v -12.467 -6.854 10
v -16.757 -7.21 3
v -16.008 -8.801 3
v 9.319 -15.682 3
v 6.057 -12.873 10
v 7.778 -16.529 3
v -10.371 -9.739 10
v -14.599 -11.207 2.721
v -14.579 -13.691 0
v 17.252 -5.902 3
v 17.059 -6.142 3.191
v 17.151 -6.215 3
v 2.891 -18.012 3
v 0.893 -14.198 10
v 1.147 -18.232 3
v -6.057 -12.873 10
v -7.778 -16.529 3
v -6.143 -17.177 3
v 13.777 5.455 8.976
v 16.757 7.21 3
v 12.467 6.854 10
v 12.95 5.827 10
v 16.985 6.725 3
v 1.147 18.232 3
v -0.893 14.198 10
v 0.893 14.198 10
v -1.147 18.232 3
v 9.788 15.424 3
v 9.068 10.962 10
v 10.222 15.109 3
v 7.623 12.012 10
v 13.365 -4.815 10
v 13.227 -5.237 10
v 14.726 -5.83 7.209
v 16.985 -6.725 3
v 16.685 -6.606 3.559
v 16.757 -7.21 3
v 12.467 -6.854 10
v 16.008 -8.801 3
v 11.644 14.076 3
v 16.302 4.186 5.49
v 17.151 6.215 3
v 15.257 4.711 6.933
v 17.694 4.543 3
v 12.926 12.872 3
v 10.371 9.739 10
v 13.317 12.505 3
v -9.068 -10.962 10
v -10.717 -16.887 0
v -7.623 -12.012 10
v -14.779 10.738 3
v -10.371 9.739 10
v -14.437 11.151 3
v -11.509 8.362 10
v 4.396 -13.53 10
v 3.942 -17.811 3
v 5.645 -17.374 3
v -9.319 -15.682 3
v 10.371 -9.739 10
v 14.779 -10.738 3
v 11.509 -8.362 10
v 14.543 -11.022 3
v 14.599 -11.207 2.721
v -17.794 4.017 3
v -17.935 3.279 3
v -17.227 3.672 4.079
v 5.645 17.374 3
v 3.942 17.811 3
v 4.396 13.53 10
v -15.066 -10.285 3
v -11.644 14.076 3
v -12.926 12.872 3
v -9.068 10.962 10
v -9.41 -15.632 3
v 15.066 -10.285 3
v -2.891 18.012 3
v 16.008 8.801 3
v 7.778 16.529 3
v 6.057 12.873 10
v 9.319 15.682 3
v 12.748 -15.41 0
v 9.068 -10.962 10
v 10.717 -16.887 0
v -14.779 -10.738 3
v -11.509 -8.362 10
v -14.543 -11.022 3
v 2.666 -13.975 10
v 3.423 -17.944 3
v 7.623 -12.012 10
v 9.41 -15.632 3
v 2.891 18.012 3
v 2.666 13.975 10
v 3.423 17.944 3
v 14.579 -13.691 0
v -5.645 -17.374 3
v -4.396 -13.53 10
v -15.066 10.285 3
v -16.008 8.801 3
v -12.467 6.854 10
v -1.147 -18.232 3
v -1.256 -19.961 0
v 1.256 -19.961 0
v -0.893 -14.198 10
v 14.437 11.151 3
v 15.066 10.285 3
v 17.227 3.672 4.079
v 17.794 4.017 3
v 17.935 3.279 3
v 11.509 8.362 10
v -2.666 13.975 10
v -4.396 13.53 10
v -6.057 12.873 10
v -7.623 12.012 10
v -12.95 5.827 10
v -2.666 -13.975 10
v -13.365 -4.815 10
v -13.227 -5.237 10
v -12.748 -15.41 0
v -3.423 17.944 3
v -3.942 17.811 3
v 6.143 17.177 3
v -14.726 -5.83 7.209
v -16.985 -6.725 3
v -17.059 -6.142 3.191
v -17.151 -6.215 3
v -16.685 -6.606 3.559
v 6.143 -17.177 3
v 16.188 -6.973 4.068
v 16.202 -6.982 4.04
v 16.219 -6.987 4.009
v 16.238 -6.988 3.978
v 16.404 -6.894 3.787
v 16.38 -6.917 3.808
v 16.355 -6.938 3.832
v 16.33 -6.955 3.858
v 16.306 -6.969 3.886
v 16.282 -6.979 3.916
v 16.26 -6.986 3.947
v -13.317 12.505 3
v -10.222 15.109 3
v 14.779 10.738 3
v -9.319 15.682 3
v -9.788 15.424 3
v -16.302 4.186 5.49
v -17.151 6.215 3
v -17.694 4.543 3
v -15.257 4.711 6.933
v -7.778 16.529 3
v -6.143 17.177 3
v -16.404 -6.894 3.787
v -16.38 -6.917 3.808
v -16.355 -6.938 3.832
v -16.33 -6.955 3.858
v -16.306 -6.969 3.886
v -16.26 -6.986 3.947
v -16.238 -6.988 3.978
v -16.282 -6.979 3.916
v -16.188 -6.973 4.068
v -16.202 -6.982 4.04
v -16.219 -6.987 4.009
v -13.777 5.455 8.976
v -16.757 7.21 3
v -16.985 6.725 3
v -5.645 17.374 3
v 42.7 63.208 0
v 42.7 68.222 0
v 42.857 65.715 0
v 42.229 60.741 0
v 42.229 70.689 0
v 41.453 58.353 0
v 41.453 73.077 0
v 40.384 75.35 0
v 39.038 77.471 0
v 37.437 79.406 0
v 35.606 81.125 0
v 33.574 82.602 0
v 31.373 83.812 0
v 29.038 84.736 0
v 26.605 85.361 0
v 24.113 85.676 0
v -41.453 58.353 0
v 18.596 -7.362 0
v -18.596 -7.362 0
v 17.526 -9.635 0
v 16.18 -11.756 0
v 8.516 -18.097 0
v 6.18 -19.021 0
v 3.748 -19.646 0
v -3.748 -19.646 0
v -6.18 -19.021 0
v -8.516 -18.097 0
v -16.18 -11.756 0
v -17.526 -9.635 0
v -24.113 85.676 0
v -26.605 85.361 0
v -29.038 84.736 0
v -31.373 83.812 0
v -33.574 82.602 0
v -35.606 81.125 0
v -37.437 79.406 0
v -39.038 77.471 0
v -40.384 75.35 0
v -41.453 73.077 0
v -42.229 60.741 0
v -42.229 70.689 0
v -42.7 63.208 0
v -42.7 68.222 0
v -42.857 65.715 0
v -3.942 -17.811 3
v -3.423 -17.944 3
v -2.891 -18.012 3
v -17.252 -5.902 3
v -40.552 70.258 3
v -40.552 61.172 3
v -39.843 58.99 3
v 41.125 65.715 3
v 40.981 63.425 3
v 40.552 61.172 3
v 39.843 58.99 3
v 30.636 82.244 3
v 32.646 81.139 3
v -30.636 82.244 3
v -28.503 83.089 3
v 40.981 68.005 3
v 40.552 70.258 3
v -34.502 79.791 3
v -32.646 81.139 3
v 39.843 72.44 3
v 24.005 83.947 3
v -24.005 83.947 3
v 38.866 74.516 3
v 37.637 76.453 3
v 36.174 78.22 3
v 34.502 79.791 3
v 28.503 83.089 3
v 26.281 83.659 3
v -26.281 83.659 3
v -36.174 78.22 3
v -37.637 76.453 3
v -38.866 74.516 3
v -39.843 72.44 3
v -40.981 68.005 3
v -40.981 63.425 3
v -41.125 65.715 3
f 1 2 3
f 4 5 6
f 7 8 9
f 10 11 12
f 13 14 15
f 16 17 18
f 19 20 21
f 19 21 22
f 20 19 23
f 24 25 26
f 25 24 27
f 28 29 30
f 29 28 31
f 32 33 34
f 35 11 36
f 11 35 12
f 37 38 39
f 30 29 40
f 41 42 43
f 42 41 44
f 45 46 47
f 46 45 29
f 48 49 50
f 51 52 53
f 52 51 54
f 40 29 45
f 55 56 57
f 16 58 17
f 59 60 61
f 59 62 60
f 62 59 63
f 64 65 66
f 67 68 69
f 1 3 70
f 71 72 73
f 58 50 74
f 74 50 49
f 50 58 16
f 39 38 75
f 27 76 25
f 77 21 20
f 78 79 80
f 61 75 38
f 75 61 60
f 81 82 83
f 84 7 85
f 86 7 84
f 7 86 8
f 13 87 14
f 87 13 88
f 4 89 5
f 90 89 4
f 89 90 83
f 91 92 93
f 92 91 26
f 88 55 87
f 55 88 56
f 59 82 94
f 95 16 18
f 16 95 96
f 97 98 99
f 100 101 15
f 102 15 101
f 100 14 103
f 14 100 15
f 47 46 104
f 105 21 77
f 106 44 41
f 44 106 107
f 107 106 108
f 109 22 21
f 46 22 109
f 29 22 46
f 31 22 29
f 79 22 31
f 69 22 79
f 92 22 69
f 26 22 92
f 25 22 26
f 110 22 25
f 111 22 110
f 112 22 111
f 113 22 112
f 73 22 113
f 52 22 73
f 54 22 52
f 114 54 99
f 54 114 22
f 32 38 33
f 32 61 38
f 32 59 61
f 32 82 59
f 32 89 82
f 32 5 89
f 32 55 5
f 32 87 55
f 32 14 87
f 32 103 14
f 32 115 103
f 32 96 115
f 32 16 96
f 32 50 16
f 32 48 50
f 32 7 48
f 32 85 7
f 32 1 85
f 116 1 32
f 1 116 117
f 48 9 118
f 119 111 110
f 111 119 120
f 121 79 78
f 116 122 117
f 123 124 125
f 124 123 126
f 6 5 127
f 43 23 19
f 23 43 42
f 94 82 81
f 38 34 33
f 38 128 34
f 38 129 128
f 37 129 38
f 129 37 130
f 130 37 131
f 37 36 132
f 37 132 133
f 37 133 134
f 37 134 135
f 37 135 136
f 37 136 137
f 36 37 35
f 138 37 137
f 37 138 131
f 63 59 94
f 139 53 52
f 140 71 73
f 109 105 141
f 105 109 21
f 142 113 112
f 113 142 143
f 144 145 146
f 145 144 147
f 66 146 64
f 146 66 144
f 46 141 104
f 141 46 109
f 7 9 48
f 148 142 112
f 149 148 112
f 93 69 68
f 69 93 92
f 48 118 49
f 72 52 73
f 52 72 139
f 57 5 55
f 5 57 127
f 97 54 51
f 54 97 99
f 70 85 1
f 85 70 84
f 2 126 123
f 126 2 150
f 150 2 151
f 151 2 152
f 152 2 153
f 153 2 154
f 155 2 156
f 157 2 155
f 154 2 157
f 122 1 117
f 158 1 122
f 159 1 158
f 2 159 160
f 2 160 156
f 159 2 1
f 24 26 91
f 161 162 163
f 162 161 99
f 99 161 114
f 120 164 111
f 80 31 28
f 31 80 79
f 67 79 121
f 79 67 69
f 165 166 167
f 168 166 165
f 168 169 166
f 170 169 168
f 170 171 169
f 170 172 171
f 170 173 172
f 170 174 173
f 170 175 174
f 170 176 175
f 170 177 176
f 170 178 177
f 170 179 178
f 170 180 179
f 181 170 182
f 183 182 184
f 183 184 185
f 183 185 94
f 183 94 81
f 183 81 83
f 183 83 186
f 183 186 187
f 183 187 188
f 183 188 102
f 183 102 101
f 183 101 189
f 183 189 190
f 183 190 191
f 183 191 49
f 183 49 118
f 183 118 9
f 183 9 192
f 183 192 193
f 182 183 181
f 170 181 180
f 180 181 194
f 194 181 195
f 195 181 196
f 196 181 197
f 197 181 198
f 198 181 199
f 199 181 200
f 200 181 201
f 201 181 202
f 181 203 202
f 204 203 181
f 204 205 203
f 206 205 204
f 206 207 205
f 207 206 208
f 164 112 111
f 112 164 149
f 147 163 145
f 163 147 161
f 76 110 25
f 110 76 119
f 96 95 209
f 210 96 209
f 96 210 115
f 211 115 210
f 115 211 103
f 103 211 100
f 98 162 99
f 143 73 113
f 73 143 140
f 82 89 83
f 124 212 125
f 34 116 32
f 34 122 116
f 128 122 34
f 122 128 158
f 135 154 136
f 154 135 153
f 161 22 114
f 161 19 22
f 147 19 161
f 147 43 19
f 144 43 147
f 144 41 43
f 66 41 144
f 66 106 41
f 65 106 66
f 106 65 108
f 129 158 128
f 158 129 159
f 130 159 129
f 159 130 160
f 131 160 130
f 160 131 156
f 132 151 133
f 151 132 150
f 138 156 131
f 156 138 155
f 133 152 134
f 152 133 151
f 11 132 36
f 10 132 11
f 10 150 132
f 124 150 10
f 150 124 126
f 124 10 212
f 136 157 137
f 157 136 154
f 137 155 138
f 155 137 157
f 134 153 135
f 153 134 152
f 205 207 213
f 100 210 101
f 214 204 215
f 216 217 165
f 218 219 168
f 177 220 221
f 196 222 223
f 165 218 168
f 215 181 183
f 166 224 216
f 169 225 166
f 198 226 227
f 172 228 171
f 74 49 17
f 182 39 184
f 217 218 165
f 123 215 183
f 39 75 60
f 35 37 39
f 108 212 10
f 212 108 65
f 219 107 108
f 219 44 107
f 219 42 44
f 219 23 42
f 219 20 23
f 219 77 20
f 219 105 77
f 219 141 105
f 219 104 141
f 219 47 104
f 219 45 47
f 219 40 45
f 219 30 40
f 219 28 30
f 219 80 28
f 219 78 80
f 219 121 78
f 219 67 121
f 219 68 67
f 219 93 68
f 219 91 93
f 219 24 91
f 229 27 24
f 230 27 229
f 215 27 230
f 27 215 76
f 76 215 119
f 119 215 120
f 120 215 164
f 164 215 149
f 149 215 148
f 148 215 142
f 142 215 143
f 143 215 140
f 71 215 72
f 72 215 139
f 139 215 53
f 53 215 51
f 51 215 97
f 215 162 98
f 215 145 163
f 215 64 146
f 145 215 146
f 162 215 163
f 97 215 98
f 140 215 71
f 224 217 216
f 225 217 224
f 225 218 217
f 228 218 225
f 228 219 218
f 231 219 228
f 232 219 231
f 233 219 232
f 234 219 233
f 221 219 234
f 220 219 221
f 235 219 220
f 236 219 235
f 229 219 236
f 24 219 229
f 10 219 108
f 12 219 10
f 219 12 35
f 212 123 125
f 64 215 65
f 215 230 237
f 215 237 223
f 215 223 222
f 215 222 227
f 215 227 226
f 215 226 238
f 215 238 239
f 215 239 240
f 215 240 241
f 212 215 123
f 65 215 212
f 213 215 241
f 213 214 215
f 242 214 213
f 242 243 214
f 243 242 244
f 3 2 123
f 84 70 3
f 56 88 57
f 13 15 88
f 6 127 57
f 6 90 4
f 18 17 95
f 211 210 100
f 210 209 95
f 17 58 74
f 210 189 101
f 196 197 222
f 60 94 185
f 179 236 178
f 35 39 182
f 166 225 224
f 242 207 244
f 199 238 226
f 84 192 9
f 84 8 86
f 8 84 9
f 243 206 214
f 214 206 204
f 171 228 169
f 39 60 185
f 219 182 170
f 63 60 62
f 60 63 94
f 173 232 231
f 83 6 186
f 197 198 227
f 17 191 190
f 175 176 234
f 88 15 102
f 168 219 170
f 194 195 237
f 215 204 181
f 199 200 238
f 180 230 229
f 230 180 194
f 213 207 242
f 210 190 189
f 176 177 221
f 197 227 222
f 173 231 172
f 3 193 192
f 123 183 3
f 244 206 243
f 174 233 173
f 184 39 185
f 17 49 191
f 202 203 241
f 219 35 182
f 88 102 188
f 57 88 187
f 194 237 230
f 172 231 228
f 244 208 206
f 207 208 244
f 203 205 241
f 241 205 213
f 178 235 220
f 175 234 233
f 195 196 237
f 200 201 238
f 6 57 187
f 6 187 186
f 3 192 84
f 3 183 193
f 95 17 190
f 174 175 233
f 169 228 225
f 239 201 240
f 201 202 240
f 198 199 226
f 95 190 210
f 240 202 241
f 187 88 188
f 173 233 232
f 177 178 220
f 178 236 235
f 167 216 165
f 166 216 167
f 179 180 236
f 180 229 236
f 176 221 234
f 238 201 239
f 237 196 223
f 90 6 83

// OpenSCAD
$fn=50;


/* [Dimensions] */
ttDia=40;
ttHght=10;
monOffset=[0,-5.5,3];
monTilt=20;
monOvDims=[192+187,235.5,9.5];;

spcng=0.25;

/* [Hidden] */
fudge=0.1;

!turnTable();

translate(monOffset) rotate([-monTilt,0,0]) 
  translate([0,8,235.5/2]) rotate([90,0,0]) USBMon();

module turnTable(){
  flankAng=30;
  ttDia2=ttDia-(tan(flankAng)*ttHght)*2;
  basDia2=ttDia-(tan(flankAng)*monOffset.z)*2;
  
  monShapePoly=[[0,0],[1.5,0.5],[1.5,ttHght*2],[-8,ttHght*2],[-8,5.5/2]];
  
  yDist= tan(monTilt)*monOvDims.y; //tan a GK/AK
  
  echo(yDist);
  hull(){
    cylinder(d1=ttDia, d2=basDia2,h=monOffset.z);
    for (ix=[-1,1])
      translate([ix*(yDist-ttDia)/2,yDist-ttDia/2]) 
        cylinder(d1=ttDia,d2=basDia2,h=monOffset.z);
  }
  difference(){
    cylinder(d1=ttDia,d2=ttDia2, h=ttHght);
    translate(monOffset)
      rotate([90,-monTilt,-90]) linear_extrude(ttDia+fudge,center=true) 
        offset(spcng) polygon(monShapePoly);
  }
}

module USBMon(){
  backDim=[196+178,230];
  midDim=[192+187,235.5,8];
  frontDim=midDim-[1,1,6.5];
  backRad=2;
  midRad=(midDim.x-backDim.x)/2;
  sclMid=[midDim.x/backDim.x,midDim.y/backDim.y];
  sclFrnt=[frontDim.x/midDim.x,frontDim.y/midDim.y];
  
  linear_extrude(height=midDim.z,scale=sclMid) hull() for (ix=[-1,1],iy=[-1,1])
    translate([ix*(backDim.x/2-backRad),iy*(backDim.y/2-backRad)]) circle(backRad);
  translate([0,0,midDim.z]) linear_extrude(height=frontDim.z,scale=sclFrnt) 
    hull() for (ix=[-1,1],iy=[-1,1])
      translate([ix*(midDim.x/2-backRad),iy*(midDim.y/2-backRad)]) circle(backRad);
}
